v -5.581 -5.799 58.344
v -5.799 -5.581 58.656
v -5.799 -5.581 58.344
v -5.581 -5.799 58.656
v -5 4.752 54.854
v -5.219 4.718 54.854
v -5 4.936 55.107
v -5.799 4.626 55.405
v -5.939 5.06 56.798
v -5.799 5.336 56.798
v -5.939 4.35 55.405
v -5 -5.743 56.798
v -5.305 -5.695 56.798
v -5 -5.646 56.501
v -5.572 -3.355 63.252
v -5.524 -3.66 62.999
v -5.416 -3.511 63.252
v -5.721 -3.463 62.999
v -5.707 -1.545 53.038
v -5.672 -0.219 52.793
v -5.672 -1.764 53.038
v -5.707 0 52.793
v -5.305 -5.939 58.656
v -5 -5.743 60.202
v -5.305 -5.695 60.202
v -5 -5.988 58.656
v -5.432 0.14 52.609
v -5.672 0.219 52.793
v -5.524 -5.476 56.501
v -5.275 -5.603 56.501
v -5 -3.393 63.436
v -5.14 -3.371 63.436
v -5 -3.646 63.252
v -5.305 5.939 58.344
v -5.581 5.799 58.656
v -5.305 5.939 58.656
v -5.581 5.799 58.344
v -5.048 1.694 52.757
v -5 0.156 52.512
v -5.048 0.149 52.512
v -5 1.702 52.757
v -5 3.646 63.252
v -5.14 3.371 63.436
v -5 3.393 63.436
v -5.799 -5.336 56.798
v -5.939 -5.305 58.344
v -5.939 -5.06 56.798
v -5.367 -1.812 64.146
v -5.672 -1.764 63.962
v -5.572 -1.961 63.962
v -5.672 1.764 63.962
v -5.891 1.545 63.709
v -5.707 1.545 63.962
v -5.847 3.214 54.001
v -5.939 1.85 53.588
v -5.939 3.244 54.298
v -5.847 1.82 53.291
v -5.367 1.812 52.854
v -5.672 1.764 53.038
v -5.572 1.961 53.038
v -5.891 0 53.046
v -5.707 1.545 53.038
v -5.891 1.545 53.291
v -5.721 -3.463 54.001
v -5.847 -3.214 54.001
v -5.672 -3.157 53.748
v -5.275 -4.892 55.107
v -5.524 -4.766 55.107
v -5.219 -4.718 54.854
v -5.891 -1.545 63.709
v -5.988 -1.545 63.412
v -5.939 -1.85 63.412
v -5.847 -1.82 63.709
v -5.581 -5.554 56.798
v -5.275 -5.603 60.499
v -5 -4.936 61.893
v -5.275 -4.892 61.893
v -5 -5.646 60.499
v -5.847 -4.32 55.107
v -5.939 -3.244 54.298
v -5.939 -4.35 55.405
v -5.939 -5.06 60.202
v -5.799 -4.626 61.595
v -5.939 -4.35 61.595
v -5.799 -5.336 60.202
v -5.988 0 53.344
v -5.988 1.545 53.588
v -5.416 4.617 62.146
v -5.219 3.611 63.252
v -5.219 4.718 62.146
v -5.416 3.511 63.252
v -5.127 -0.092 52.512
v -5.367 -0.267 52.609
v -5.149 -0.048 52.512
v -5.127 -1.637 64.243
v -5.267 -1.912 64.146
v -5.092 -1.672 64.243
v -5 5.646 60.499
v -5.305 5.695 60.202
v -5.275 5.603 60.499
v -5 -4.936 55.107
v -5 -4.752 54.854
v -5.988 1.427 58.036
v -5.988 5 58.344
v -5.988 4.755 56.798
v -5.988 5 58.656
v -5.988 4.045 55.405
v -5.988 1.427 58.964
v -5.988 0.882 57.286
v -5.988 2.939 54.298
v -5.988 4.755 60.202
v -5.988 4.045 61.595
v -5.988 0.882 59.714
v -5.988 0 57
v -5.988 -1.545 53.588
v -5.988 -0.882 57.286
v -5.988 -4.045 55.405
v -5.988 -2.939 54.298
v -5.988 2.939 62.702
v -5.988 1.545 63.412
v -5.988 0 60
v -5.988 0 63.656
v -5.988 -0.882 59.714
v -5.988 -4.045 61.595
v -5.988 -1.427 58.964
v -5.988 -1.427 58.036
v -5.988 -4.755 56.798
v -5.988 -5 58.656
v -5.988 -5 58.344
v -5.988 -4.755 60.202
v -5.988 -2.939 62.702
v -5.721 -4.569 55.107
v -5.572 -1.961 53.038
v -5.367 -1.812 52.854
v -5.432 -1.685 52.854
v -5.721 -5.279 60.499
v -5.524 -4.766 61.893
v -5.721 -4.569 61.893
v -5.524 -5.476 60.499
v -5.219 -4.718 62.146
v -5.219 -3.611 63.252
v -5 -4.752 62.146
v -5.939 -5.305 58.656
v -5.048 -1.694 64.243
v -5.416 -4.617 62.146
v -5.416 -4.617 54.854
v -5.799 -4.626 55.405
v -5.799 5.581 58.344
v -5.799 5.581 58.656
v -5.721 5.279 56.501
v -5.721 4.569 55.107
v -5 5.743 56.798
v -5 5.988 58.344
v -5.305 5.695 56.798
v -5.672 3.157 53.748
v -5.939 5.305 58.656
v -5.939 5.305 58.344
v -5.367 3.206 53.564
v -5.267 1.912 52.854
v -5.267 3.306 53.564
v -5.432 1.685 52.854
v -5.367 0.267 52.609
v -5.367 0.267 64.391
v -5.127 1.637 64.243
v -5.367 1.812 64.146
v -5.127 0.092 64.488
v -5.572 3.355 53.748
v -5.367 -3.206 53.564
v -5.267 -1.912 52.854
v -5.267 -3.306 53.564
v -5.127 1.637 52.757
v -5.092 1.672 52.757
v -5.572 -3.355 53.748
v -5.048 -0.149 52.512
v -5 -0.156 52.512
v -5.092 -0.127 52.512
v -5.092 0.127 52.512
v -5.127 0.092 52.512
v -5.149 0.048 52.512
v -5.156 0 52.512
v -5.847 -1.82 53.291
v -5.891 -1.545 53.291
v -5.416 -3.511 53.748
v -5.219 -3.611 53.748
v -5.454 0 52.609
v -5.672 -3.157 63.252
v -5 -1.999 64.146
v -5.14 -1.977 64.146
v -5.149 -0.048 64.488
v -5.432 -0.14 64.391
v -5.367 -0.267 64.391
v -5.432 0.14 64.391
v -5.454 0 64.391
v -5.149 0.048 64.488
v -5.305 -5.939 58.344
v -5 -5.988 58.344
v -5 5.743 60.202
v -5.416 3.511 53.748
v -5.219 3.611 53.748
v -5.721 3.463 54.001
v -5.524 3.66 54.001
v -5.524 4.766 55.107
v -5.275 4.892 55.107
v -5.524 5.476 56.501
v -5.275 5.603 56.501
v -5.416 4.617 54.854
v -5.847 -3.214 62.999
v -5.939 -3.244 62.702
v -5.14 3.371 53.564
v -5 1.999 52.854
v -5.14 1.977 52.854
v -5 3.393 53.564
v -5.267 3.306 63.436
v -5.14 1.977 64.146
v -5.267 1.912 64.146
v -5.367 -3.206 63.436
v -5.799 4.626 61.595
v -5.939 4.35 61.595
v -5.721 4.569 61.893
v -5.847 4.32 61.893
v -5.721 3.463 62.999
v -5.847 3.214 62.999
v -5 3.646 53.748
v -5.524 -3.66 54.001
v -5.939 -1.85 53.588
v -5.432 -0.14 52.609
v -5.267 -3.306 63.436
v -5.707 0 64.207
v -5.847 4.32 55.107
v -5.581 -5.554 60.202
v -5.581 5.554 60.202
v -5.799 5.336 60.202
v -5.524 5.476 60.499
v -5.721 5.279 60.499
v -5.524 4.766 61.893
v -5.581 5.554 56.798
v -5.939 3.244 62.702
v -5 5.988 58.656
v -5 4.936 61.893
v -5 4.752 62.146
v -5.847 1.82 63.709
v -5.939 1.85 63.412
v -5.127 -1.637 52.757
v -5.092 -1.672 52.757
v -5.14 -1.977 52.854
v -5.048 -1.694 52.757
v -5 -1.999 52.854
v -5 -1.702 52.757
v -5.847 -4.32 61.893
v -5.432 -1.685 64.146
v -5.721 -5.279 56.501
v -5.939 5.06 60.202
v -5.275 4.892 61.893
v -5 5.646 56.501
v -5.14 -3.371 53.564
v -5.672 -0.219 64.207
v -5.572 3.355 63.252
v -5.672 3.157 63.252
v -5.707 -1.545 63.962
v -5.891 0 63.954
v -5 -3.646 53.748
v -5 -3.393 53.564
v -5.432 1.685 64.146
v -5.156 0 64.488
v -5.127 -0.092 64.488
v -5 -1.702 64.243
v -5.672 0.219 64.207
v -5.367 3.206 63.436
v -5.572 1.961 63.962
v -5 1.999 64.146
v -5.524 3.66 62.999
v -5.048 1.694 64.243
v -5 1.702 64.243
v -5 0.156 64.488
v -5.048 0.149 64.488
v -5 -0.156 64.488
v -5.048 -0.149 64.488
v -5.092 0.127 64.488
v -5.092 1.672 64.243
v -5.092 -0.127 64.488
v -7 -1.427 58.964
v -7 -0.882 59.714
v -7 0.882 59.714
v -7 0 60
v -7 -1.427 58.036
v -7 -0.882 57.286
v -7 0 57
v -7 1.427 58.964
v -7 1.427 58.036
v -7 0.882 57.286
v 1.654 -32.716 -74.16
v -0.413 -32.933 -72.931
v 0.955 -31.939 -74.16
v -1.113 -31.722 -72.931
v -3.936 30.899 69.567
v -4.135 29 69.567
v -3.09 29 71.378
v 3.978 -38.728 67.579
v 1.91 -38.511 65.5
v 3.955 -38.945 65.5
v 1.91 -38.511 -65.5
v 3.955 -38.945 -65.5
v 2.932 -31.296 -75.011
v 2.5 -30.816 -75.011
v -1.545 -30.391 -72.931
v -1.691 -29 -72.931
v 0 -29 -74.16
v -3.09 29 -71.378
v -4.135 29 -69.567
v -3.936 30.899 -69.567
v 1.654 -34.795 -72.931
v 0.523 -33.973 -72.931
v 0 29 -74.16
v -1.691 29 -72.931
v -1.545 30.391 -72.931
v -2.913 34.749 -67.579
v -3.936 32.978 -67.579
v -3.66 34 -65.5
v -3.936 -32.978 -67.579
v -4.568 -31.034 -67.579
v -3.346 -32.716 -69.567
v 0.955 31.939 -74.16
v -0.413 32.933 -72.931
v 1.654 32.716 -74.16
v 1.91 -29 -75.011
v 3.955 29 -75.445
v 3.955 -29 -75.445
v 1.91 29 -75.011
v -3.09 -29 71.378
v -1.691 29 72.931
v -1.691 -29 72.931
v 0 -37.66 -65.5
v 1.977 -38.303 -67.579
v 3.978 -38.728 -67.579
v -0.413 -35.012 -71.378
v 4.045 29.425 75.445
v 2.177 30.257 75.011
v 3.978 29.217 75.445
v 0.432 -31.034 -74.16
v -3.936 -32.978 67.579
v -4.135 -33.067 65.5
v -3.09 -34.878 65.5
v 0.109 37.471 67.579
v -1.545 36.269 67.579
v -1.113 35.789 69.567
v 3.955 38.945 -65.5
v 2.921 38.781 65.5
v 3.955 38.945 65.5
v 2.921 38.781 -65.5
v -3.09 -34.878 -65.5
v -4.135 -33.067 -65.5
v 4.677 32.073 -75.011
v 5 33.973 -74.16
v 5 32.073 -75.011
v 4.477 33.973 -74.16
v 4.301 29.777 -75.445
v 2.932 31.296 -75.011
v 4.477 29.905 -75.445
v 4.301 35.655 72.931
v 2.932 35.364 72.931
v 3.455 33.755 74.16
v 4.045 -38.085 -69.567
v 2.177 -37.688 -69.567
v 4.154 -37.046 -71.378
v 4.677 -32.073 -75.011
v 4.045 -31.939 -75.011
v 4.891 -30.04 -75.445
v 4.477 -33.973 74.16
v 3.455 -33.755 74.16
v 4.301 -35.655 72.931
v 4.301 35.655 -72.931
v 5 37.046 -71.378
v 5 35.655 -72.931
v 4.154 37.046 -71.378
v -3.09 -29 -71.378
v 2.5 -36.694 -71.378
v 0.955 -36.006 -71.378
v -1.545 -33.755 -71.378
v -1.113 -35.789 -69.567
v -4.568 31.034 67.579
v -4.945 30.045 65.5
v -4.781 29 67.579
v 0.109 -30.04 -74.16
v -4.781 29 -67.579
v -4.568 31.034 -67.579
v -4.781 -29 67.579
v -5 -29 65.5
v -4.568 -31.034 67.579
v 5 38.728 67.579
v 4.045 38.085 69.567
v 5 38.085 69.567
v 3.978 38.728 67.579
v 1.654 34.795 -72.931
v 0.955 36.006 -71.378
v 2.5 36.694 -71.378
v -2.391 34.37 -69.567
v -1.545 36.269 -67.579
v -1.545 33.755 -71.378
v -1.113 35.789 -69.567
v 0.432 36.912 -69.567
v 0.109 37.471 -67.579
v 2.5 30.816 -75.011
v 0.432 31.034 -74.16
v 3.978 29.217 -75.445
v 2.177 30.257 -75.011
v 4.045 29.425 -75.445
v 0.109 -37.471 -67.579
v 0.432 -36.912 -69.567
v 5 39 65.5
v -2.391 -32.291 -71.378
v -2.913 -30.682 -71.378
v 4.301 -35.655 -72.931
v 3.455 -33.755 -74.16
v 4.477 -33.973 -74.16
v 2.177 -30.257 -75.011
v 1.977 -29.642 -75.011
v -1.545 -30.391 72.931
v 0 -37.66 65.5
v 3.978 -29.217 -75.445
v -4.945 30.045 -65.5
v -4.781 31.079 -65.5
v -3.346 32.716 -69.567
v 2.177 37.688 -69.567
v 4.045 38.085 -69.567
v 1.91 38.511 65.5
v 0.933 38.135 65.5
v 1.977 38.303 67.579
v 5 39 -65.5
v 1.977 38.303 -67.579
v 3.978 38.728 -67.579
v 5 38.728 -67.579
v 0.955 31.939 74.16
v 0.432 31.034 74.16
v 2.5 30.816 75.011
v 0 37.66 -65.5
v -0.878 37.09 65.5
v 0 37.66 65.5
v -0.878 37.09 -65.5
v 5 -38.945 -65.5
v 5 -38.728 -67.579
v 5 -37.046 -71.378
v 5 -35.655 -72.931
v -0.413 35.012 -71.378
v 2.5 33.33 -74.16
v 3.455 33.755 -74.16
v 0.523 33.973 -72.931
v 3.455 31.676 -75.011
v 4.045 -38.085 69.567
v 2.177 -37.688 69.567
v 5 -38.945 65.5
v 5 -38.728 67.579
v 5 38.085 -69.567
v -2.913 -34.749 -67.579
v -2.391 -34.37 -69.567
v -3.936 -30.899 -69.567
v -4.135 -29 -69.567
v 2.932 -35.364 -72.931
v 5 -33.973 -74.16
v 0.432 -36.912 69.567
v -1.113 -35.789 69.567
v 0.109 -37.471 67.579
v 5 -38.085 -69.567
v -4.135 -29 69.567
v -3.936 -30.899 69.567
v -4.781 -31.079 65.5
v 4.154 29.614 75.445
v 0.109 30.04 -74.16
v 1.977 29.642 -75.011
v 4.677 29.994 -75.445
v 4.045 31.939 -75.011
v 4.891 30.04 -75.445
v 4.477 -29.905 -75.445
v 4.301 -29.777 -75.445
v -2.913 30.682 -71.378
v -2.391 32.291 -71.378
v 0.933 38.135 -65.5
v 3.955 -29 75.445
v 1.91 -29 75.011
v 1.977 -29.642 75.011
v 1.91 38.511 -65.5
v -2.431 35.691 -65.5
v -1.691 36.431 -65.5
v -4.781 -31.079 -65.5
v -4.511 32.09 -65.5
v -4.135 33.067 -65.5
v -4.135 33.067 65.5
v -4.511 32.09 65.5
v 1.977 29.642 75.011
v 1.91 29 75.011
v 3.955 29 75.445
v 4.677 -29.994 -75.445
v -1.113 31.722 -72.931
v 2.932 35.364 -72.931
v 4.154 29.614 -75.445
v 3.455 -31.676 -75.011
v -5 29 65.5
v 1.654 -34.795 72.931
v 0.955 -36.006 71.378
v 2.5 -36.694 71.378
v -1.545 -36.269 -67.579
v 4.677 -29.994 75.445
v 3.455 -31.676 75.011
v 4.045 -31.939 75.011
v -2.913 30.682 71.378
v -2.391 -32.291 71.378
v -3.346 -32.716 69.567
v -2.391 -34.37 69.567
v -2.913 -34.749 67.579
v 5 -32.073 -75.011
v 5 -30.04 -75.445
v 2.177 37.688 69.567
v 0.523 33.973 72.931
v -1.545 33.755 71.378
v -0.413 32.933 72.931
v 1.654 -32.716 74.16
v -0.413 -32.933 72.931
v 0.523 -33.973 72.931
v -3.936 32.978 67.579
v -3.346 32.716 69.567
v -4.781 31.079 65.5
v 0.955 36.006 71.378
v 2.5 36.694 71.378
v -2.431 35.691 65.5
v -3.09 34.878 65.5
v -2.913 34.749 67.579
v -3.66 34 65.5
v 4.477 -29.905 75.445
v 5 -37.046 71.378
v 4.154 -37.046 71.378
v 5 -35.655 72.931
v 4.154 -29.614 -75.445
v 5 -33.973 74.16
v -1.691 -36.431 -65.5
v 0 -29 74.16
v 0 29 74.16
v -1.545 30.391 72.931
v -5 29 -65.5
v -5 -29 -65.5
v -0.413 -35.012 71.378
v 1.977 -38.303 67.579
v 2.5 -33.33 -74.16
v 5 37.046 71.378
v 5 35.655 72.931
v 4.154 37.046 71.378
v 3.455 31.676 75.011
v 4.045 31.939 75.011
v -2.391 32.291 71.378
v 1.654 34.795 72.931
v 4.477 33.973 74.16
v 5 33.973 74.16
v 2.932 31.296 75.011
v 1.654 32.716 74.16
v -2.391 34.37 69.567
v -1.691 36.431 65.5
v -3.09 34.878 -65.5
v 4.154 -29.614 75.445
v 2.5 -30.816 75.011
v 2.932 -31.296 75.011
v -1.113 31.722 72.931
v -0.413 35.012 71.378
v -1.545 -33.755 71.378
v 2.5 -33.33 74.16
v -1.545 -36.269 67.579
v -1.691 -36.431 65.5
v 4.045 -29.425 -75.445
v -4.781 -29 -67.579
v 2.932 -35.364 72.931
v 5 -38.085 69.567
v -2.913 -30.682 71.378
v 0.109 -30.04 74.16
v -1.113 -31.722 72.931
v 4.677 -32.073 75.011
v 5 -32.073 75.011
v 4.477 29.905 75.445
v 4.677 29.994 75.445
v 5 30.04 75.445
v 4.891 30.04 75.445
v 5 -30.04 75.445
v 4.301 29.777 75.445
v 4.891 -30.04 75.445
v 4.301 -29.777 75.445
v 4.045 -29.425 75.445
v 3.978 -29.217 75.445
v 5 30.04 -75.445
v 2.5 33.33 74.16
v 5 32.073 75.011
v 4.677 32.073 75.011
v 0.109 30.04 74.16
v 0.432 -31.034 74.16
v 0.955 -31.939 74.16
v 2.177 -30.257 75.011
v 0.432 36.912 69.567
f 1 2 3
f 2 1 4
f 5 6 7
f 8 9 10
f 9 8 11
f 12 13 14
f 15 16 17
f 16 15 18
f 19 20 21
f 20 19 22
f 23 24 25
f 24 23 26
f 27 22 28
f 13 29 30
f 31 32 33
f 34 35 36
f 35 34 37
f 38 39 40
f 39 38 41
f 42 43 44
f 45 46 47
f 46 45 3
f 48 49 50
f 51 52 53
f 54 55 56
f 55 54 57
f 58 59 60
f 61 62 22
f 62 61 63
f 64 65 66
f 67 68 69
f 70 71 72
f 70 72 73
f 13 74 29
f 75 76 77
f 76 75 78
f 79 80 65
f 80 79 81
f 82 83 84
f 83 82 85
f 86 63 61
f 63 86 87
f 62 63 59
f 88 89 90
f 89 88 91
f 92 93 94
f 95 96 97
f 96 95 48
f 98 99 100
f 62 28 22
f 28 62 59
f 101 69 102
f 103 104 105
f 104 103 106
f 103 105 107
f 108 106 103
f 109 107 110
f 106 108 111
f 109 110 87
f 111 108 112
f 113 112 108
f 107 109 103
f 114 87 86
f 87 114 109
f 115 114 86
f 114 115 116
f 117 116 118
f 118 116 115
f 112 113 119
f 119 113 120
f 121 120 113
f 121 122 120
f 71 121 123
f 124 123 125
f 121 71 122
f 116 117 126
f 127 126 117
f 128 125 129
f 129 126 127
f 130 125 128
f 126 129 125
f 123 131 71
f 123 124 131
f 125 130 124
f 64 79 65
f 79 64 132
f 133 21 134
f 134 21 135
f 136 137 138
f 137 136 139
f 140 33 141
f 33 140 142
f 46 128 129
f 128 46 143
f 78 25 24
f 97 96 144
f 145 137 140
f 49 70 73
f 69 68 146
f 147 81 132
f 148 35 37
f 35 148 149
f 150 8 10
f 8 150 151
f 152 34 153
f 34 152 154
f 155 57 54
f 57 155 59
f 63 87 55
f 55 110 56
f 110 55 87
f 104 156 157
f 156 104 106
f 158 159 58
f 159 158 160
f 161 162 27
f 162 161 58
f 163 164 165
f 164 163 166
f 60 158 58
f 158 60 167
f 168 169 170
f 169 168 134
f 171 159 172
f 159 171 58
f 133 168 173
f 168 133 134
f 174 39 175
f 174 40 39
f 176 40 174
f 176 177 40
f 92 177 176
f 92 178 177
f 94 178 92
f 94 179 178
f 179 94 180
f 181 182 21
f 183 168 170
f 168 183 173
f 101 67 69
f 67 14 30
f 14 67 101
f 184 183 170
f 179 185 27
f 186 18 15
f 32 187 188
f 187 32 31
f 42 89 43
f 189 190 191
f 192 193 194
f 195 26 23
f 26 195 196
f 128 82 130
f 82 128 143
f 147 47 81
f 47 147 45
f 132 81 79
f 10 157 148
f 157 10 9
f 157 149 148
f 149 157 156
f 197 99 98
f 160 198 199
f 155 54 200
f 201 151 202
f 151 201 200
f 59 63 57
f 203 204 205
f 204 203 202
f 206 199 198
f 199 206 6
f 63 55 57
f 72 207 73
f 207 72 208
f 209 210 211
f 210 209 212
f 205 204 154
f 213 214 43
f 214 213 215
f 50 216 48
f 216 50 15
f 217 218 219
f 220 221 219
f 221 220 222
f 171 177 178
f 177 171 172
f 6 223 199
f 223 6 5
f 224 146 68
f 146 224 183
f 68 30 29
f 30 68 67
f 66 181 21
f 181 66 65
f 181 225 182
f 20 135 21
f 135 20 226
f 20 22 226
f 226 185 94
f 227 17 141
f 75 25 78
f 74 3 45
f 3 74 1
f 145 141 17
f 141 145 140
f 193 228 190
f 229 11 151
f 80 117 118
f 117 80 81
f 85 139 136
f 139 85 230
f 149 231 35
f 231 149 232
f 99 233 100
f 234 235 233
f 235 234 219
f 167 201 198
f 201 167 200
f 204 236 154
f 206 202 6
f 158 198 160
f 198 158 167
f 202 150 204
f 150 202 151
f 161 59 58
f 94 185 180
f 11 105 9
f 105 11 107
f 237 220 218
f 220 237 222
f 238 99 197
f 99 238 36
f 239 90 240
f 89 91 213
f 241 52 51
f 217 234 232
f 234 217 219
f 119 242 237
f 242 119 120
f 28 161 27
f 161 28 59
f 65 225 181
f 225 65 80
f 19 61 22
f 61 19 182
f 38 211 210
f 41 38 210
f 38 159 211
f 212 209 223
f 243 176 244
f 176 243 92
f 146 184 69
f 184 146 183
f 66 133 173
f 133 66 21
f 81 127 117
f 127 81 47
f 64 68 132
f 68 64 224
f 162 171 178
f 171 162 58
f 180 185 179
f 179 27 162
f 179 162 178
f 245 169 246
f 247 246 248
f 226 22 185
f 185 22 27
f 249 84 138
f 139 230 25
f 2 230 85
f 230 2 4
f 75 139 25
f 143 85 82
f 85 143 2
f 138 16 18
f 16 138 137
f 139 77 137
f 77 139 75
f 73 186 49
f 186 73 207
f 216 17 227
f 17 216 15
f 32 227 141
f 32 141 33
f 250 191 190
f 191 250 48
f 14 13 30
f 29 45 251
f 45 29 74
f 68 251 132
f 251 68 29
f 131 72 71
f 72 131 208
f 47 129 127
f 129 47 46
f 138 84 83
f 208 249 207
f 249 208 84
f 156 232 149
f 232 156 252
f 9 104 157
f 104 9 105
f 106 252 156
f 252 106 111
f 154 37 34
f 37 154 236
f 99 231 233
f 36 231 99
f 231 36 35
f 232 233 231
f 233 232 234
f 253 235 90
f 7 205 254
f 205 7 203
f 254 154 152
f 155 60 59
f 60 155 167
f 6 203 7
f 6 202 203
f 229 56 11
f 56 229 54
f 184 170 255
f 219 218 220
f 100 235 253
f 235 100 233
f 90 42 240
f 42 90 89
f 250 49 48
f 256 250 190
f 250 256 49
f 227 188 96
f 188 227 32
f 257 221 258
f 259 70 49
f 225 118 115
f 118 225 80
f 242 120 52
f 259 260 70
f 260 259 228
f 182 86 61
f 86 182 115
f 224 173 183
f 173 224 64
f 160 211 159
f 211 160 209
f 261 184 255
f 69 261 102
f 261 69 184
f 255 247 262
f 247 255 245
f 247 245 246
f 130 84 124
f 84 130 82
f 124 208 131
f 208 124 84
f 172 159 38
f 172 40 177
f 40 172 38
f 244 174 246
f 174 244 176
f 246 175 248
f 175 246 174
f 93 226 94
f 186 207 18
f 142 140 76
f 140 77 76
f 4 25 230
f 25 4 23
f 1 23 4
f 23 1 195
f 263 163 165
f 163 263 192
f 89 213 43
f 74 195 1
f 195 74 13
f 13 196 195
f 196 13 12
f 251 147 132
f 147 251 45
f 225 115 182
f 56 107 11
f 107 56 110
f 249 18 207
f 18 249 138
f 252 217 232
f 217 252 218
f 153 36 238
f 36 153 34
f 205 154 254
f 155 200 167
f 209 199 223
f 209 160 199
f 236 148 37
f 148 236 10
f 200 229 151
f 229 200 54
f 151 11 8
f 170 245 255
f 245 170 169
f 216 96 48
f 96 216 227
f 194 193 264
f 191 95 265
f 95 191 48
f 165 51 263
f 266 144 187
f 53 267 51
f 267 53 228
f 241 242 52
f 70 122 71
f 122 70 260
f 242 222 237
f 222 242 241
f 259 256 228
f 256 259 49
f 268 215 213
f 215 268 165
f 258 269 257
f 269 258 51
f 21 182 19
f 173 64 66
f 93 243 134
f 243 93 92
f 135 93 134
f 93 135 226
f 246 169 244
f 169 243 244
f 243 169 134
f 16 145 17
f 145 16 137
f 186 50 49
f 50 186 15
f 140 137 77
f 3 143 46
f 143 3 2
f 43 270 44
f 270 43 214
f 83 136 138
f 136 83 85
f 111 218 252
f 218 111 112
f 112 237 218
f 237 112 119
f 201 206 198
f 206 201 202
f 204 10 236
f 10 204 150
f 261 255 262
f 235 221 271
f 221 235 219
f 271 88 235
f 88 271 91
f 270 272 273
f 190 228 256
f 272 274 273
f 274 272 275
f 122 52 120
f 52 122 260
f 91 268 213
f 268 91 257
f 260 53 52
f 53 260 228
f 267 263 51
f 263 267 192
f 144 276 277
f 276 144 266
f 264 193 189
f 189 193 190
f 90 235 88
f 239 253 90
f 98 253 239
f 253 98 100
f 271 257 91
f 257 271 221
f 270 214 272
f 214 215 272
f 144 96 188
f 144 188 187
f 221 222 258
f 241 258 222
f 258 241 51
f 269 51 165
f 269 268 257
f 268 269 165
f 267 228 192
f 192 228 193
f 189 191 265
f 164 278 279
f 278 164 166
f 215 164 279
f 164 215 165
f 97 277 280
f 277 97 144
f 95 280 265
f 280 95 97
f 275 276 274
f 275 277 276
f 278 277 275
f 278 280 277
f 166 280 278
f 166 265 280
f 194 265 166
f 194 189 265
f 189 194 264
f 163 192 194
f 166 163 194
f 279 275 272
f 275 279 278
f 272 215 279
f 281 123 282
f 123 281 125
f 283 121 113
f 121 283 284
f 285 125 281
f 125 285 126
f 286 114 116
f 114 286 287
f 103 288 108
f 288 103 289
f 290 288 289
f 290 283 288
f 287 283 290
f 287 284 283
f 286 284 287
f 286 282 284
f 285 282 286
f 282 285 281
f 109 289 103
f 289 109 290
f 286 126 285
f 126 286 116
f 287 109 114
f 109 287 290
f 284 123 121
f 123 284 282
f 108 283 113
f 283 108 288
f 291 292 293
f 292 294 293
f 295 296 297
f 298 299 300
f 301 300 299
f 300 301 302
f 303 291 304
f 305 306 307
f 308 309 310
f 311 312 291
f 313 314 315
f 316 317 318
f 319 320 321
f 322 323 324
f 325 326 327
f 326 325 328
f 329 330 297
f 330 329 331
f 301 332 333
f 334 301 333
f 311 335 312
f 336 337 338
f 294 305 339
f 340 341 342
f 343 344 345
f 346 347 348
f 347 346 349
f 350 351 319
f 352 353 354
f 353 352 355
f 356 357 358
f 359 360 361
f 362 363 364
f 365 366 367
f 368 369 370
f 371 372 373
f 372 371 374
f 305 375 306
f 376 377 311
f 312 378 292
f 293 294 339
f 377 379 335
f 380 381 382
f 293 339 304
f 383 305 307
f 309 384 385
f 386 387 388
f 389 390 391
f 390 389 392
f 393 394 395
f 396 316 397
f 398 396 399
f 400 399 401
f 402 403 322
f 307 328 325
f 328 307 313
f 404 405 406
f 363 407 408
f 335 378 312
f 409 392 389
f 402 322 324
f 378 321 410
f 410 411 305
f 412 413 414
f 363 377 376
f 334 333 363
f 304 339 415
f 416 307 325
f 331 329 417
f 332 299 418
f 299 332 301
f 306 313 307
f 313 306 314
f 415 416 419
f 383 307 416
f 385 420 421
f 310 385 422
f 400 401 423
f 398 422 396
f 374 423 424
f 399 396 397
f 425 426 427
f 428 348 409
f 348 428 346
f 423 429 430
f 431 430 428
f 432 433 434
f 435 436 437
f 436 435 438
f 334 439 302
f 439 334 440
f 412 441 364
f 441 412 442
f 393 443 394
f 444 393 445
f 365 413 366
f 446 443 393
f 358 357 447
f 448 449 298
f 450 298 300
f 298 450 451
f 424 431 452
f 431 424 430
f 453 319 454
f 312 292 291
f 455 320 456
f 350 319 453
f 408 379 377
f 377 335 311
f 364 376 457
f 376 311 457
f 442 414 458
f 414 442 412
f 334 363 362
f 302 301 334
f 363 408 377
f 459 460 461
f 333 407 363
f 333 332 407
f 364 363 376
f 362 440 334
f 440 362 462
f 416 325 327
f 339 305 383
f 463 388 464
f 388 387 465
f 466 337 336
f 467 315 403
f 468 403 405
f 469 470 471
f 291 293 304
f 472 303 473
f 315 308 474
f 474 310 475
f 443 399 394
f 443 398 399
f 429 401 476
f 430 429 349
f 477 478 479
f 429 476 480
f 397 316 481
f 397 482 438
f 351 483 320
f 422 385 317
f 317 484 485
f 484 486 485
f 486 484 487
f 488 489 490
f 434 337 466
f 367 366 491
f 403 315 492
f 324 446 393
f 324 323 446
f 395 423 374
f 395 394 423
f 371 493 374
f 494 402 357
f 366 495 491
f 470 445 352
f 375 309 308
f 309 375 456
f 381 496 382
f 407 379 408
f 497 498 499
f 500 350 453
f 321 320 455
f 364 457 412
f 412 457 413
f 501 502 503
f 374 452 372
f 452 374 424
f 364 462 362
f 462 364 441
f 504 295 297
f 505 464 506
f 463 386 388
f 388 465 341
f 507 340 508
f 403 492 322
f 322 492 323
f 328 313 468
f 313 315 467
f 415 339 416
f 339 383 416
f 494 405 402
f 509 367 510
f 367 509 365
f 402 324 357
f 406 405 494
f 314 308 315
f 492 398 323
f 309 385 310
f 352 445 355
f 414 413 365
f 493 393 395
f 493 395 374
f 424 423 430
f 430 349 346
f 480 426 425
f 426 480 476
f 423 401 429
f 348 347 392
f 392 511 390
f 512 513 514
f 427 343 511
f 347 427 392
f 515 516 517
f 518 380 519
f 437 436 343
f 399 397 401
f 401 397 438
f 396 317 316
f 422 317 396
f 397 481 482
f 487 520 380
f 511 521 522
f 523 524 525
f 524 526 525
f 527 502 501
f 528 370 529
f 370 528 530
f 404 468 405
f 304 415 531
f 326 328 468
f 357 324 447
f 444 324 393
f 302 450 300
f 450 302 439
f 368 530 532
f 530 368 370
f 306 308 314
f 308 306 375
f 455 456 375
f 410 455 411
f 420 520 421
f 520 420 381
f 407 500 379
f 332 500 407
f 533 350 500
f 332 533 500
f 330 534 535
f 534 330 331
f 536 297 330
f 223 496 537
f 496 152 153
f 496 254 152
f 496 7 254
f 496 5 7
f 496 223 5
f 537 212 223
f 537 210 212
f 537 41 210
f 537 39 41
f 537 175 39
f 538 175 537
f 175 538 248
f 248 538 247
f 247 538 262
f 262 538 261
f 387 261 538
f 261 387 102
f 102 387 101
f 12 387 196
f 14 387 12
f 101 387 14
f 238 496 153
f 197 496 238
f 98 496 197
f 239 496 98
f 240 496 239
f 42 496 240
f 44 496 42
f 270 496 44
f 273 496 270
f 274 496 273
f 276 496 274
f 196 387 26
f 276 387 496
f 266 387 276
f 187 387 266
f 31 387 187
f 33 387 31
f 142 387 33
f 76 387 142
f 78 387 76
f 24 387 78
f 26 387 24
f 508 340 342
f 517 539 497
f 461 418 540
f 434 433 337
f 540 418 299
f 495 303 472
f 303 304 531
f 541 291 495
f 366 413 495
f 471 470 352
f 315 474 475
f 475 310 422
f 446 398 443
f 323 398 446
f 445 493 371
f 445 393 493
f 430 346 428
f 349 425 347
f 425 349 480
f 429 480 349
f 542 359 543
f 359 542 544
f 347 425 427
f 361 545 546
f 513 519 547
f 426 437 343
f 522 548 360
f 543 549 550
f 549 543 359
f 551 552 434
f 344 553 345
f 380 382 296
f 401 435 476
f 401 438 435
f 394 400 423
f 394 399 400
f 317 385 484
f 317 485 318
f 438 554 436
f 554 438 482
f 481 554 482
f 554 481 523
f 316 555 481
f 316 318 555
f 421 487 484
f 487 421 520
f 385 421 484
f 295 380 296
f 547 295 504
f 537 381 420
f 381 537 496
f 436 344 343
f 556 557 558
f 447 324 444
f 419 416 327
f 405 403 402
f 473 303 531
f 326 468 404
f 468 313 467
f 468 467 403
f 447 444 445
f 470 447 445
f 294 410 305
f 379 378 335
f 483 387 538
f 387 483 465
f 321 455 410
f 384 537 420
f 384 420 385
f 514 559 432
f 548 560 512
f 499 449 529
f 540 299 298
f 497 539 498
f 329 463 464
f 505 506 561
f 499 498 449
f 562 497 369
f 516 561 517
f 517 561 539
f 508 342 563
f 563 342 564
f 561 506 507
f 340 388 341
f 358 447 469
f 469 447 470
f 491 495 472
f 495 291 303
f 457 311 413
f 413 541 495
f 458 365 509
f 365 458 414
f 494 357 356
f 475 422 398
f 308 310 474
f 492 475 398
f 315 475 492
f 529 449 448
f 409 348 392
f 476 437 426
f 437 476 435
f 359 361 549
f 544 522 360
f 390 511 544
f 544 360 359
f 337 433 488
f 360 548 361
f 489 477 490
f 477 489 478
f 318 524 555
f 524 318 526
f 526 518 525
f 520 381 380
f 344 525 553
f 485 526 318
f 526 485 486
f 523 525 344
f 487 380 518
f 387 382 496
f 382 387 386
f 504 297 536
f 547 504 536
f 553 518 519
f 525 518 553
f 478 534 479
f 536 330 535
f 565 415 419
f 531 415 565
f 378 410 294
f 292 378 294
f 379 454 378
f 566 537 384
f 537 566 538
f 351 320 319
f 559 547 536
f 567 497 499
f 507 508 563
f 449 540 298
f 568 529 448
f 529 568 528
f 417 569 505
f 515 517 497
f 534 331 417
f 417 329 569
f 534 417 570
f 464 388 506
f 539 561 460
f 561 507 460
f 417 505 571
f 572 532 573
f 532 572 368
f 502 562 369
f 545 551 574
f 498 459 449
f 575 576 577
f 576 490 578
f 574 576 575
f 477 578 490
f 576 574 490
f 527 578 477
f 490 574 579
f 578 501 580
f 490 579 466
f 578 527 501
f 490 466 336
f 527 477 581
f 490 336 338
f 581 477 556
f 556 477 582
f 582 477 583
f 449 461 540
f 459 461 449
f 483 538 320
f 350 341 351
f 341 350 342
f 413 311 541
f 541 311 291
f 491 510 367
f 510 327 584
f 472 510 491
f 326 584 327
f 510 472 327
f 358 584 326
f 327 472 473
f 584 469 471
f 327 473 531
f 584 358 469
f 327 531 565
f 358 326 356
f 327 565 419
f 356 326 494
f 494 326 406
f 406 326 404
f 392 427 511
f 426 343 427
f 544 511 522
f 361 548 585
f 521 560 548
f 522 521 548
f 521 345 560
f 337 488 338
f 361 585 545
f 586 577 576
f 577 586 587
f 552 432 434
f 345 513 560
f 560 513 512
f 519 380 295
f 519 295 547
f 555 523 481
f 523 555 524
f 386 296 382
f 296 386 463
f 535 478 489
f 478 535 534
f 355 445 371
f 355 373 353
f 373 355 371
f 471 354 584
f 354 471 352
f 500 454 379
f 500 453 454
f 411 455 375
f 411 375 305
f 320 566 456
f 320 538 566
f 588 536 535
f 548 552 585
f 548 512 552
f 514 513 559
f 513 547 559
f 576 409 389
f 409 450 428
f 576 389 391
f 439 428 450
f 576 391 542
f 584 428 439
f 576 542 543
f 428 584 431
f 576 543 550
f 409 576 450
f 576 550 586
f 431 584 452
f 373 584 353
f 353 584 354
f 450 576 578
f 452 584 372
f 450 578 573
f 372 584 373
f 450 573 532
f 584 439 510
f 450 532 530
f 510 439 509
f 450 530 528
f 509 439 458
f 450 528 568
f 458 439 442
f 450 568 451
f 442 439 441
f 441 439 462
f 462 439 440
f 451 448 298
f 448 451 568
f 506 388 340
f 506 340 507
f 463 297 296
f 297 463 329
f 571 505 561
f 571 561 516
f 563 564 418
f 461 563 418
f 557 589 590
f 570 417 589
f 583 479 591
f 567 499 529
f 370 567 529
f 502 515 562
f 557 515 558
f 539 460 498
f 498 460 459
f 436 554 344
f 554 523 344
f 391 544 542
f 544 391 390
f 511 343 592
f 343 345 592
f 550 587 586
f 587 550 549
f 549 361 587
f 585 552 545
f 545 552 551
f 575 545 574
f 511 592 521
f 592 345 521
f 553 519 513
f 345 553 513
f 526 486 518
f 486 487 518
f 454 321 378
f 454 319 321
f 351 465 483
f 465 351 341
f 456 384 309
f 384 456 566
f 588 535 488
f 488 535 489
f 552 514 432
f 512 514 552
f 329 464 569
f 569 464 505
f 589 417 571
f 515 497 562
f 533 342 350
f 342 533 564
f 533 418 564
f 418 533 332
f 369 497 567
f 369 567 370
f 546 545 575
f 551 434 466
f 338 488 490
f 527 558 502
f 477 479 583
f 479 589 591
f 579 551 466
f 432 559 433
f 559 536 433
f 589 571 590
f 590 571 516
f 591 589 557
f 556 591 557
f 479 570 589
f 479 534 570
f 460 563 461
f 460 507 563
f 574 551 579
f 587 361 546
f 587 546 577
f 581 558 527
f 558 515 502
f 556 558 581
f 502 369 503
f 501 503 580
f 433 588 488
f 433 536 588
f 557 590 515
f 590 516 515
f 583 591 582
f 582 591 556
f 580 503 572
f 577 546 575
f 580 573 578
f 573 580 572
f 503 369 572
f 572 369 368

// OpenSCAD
//Phone model, for reference to the other modules
//in the model size will be added 3 mm in every direction for a beter fit

module phone() {
//Module variables
    tichn = 10; //tichness3
    width = 78 - 2*tichn; // 
    heigth = 151 - 2*tichn; //
    
//internal modules
    module edge (length = 10, edge_rad = tichn) {
        adj = 1; //adjust value
        
        rotate([0,0,0]) difference() {
            cylinder(r=edge_rad, h=length, center = true);
            translate([0,-(edge_rad+adj/2),-(length/2+adj/2)]) cube([edge_rad+adj, 2*edge_rad+adj, length+adj]);
            translate([-(edge_rad+adj/2),0,-(length/2+adj/2)]) cube([edge_rad+adj, edge_rad+adj, length+adj]);
        }
    }
    
    module edge_connect() {
        adj = 1;
        difference() {
            sphere(tichn);
            translate([tichn/2,0,0]) cube([tichn,2*tichn,2*tichn],true);
        }
    }
    
    module camera (diam = 10) { 
        heig = 8;
        //Camera Eye
        rotate([0,0,180]) union() {
            color("grey") minkowski () {
                $fn = 20;
                rotate([0,90,0]) cylinder(h=heig,d=diam,center= true);
                sphere(1); 
            }
            color("black") translate([heig/2+1,0,0]) rotate([0,90]) cylinder(h=2, d=3, center=true, $fn = 10);
        }              
    } 
    
    
    translate([-1,0,heigth/2+tichn-17]) camera();
    hull() {
        translate([tichn/2, width/2, heigth/2]) edge_connect();
        translate([tichn/2, -width/2, heigth/2]) edge_connect();
        translate([tichn/2, width/2, -heigth/2]) edge_connect();
        translate([tichn/2, -width/2, -heigth/2]) edge_connect();
        
        translate([tichn/2,width/2]) rotate([0,0,-90]) edge(heigth);
        translate([tichn/2,-width/2]) edge(heigth);
        translate([tichn/2,0,heigth/2]) rotate([-90,0,0]) edge(width);
        translate([tichn/2,0,-heigth/2]) rotate([90,0,0]) edge(width);
        rotate([0,0,0]) cube([tichn,width,heigth],true);
    }
}

phone();
